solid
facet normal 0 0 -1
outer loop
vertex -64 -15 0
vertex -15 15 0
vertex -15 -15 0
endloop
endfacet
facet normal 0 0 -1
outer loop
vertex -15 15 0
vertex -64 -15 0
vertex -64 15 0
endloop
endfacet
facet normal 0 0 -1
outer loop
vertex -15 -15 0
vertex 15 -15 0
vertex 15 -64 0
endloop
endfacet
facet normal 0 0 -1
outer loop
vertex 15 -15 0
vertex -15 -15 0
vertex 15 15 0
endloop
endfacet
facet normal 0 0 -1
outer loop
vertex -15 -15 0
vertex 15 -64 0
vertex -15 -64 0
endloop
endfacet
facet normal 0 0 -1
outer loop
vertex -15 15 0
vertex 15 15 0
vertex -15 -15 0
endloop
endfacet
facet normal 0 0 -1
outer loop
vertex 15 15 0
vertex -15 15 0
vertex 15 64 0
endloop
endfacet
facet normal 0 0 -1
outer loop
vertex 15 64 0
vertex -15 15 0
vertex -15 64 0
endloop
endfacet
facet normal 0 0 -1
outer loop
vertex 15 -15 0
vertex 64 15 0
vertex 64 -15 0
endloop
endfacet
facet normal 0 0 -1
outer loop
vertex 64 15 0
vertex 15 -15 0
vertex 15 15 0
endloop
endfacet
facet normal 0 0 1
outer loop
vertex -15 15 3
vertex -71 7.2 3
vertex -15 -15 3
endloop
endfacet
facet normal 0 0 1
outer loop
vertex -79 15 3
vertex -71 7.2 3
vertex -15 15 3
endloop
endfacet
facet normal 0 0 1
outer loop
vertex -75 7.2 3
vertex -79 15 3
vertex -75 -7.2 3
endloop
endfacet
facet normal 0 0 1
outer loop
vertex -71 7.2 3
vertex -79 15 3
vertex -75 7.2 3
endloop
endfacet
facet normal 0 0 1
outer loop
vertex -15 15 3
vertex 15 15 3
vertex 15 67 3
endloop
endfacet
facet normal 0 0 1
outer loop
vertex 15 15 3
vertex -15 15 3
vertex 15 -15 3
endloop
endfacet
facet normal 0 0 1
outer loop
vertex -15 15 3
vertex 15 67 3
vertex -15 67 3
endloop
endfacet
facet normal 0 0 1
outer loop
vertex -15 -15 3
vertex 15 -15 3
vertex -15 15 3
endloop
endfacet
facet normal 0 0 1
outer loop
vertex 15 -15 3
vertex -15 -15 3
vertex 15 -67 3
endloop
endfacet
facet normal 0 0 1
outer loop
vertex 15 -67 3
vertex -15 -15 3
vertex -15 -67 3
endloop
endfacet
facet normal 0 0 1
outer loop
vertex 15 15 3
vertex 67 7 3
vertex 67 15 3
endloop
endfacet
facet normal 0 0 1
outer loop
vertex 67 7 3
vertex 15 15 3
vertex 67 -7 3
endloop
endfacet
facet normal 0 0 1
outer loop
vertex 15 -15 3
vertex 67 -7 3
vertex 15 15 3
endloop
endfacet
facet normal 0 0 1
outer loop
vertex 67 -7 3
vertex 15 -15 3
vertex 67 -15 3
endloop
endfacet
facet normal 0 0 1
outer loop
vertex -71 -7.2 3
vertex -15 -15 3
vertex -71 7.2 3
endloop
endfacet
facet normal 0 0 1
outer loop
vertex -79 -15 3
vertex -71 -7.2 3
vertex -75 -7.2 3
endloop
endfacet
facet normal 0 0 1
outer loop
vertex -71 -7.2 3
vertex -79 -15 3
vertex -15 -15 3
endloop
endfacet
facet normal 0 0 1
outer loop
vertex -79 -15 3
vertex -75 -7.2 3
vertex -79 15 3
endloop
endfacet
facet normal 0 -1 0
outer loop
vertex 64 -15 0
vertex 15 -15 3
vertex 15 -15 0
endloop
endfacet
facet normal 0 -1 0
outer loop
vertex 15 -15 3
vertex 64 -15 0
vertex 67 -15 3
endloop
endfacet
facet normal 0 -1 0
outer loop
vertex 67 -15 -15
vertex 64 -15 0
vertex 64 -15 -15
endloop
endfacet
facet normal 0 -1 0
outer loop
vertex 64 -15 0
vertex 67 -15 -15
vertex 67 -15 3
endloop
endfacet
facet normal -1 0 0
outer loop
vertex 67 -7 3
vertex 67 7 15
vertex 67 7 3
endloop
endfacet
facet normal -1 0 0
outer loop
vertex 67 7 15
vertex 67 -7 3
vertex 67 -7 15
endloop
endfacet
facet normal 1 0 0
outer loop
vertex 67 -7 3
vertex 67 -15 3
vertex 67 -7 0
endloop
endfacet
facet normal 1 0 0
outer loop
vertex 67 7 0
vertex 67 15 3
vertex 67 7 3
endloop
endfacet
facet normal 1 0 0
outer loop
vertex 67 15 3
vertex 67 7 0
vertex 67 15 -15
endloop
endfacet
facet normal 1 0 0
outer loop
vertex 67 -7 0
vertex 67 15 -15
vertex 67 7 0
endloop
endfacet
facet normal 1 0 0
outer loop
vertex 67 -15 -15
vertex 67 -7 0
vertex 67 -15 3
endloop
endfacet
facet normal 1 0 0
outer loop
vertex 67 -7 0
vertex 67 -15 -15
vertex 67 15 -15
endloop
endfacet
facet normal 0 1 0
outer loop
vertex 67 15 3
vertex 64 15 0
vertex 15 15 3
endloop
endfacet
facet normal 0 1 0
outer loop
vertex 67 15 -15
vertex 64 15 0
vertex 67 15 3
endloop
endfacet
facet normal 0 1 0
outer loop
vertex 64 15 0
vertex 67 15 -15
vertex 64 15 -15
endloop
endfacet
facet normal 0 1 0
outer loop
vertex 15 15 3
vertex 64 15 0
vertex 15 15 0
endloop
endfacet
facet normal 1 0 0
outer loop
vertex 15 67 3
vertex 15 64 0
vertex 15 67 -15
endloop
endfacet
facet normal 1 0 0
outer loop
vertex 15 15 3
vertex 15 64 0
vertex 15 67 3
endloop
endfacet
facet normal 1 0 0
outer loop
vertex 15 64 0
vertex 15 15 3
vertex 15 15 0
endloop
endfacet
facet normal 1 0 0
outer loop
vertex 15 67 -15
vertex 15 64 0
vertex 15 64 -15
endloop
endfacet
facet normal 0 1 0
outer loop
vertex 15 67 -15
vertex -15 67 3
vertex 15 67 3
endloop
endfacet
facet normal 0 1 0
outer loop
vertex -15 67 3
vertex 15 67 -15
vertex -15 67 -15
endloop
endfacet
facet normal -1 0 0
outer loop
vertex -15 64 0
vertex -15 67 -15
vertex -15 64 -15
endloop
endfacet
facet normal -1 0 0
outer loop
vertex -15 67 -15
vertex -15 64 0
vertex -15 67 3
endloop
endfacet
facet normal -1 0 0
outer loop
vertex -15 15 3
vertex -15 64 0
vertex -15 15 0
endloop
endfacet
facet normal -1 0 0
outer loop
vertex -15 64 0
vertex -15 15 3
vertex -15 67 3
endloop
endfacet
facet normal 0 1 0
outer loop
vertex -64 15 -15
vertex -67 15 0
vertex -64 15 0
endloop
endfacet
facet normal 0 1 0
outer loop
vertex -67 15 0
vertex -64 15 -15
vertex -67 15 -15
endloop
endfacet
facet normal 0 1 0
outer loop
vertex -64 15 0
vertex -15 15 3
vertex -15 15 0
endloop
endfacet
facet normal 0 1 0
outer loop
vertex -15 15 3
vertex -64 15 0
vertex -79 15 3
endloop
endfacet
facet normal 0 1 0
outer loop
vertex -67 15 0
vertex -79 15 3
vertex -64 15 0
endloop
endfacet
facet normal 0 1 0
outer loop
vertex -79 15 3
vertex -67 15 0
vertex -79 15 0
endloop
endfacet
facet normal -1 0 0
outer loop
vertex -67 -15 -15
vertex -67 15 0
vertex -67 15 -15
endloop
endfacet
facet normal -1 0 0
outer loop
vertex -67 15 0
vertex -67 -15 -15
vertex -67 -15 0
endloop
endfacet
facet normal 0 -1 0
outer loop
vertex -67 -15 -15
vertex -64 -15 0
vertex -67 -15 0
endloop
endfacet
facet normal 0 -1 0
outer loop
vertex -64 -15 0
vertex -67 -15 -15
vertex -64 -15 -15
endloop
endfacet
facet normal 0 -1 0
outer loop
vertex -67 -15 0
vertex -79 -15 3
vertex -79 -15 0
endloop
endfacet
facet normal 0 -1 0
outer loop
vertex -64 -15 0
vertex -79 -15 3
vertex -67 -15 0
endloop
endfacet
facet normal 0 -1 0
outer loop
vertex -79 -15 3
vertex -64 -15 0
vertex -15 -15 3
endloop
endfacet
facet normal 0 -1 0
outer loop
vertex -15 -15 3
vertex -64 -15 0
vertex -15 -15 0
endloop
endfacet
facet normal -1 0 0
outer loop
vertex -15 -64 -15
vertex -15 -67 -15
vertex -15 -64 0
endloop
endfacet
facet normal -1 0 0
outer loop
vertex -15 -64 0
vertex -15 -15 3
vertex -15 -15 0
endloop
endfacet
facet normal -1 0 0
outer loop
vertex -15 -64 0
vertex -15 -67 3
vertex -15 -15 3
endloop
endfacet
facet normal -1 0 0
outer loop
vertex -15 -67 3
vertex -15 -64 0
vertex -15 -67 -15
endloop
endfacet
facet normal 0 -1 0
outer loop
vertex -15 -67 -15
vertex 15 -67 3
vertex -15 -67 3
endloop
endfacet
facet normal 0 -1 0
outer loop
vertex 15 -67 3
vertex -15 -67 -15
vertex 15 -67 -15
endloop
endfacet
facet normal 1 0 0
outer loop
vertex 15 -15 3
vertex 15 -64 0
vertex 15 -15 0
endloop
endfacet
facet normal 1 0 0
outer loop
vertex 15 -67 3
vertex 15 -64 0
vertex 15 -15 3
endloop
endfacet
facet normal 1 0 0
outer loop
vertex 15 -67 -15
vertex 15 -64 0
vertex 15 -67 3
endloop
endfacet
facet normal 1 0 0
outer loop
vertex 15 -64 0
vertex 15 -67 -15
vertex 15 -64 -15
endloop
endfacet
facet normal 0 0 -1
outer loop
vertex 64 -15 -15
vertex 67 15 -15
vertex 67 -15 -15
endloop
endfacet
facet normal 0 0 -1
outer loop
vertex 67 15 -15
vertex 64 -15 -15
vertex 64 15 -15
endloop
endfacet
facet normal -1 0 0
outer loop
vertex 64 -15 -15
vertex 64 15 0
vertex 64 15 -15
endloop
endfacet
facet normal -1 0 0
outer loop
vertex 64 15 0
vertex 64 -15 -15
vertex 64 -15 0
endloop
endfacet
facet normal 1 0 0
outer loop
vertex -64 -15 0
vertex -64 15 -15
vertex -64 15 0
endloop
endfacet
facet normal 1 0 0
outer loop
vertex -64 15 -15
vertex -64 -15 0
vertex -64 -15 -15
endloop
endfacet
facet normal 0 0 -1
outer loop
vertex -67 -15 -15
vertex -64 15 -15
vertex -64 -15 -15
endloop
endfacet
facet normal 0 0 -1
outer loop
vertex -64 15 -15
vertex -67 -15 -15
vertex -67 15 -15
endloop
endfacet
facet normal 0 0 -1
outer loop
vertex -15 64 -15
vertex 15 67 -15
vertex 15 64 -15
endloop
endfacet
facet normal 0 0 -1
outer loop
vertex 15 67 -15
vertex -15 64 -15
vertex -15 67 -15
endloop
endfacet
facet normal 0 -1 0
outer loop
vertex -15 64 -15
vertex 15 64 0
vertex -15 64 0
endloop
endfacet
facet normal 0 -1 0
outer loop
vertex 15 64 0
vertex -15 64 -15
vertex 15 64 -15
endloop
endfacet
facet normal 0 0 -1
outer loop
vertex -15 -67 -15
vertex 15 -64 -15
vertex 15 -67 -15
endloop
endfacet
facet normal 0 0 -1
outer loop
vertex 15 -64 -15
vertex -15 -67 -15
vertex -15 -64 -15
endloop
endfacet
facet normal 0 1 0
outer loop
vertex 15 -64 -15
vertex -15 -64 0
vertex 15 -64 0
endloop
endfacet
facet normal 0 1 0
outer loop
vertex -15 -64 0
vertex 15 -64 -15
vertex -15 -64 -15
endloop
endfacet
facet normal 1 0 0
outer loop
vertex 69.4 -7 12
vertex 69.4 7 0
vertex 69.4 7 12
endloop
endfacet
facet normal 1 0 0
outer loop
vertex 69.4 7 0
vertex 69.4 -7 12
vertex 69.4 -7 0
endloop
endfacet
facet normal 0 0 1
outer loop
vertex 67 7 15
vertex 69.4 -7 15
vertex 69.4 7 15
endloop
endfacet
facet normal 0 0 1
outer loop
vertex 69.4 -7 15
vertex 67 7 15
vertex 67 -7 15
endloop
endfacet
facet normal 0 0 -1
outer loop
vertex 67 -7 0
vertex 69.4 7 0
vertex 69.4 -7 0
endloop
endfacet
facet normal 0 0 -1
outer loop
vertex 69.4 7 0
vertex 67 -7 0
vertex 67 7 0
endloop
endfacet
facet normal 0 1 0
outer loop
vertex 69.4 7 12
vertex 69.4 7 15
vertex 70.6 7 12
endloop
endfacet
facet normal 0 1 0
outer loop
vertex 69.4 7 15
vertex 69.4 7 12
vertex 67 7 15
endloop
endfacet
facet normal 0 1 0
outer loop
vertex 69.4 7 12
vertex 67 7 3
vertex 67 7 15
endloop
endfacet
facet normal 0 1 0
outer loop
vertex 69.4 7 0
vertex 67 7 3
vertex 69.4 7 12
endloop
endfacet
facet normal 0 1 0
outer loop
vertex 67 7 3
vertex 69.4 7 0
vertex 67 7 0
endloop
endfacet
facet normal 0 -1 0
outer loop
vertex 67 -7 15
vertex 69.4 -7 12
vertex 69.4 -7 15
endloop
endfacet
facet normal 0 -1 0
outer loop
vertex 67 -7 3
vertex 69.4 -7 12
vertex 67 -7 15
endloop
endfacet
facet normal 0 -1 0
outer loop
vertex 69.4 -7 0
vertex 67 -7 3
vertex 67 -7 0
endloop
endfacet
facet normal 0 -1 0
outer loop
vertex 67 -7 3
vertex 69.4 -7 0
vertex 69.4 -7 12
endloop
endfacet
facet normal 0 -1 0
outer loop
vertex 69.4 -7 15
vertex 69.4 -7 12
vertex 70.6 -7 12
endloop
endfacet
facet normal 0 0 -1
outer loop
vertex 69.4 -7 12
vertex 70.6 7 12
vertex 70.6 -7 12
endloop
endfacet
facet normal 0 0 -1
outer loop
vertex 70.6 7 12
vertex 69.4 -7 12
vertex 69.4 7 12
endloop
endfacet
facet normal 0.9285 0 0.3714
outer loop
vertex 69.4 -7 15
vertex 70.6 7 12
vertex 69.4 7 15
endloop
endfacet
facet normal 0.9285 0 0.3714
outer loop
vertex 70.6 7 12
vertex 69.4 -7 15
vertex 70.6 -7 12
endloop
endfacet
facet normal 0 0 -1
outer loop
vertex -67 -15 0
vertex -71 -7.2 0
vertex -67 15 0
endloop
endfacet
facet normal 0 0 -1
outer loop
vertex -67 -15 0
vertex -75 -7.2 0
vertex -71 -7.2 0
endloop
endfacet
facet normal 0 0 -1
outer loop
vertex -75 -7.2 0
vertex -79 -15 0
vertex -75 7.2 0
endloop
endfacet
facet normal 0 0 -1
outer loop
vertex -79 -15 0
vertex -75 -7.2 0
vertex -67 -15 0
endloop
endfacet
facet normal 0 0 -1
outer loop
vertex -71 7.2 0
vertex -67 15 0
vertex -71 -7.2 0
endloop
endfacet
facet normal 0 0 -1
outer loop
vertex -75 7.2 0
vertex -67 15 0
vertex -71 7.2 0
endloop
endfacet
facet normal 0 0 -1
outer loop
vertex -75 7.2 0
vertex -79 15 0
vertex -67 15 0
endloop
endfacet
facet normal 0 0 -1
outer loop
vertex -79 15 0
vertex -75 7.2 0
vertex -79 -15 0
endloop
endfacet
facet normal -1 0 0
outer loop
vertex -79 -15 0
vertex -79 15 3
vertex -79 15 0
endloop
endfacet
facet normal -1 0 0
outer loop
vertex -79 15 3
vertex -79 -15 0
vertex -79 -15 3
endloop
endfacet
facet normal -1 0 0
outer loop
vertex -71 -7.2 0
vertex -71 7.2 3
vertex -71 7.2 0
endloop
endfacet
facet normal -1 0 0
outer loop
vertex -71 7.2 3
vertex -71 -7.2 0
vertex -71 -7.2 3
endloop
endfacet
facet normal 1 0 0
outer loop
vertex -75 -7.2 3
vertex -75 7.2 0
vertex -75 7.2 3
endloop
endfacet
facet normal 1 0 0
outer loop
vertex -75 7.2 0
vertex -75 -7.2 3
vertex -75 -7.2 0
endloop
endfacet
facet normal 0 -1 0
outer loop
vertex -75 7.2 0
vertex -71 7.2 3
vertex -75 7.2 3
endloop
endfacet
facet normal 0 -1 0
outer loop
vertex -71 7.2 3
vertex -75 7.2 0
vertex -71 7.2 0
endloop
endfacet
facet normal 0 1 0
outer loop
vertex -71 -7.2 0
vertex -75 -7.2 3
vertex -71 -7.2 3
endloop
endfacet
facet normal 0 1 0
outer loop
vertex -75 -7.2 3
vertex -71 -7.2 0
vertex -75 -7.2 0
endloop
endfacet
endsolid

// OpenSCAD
// "Plus"-shaped claw that drops onto a Mac mini M4 (127x127x50mm).
// Four fingers wrap ~15mm down each side. The +X arm tip carries a flexible
// snap-post with a barb; the -X arm tip carries a thru-hole receiver tab.
// Two prints chain end-to-end: print A's +X post snaps up through print B's
// -X receiver hole as print B is lowered onto its mini.

$fa = 2;
$fs = 0.5;

// === Mac mini M4 ===
mini_w = 127;

// === Claw ===
arm_width        = 30;
plate_thickness  = 3;
finger_height    = 15;
finger_thickness = 3;
side_clearance   = 0.5;

inner_span   = mini_w + 2 * side_clearance;
outer_span   = inner_span + 2 * finger_thickness;
finger_inner = inner_span / 2;
finger_outer = outer_span / 2;

// === Hook latch ===
post_thick    = 2.4;   // X thickness of the flexible post
post_width    = 14;    // Y width of the post
post_height   = 12;    // Z height above plate
barb_protrude = 1.2;   // how far the barb sticks out past post_thick
barb_height   = 3;     // Z height of the barb ramp
tab_reach     = 12;    // how far the receiver tab extends past the finger
tab_thickness = plate_thickness;  // same as plate for cleanliness
fit_gap       = 0.4;   // clearance around post in the receiver hole

module claw_body() {
    union() {
        linear_extrude(plate_thickness)
            union() {
                square([outer_span, arm_width], center = true);
                square([arm_width, outer_span], center = true);
            }
        translate([finger_inner, -arm_width/2, -finger_height])
            cube([finger_thickness, arm_width, finger_height + plate_thickness]);
        translate([-finger_outer, -arm_width/2, -finger_height])
            cube([finger_thickness, arm_width, finger_height + plate_thickness]);
        translate([-arm_width/2, finger_inner, -finger_height])
            cube([arm_width, finger_thickness, finger_height + plate_thickness]);
        translate([-arm_width/2, -finger_outer, -finger_height])
            cube([arm_width, finger_thickness, finger_height + plate_thickness]);
    }
}

// Vertical flexible post on the +X arm, just outside the +X finger.
// Barb on +X face at the top: slope on top (insertion ramp), flat on bottom
// (retention face that catches the receiver tab against upward pull).
module snap_post() {
    post_x = finger_outer;
    cube_base = [post_x, -post_width/2, 0];
    translate(cube_base)
        cube([post_thick, post_width, plate_thickness + post_height]);
    // Triangular prism barb. Bottom face is flat (retention); top face slopes
    // from tip back to the post face (insertion ramp).
    x0 = post_x + post_thick;
    z0 = plate_thickness + post_height - barb_height;
    polyhedron(
        points = [
            [x0,                  -post_width/2, z0             ],
            [x0 + barb_protrude,  -post_width/2, z0             ],
            [x0,                  -post_width/2, z0 + barb_height],
            [x0,                   post_width/2, z0             ],
            [x0 + barb_protrude,   post_width/2, z0             ],
            [x0,                   post_width/2, z0 + barb_height],
        ],
        faces = [
            [0, 1, 2],
            [3, 5, 4],
            [0, 2, 5, 3],
            [0, 3, 4, 1],
            [1, 4, 5, 2],
        ]);
}

// Receiver tab on -X arm: extends outward past the -X finger with a thru-hole.
// As the mating print descends, its post (from another claw) enters this hole
// from below; the barb flexes through and snaps above the tab.
module receiver_tab() {
    // tab x range in this print's frame: [-finger_outer - tab_reach, -finger_outer]
    difference() {
        translate([-finger_outer - tab_reach, -arm_width/2, plate_thickness - tab_thickness])
            cube([tab_reach, arm_width, tab_thickness]);
        // thru-hole sized for post + barb_protrude + clearance
        hole_x = -finger_outer - tab_reach + (tab_reach - (post_thick + barb_protrude + fit_gap))/2;
        translate([hole_x, -(post_width + fit_gap)/2, plate_thickness - tab_thickness - 0.1])
            cube([post_thick + barb_protrude + fit_gap,
                  post_width + fit_gap,
                  tab_thickness + 0.2]);
    }
}

union() {
    claw_body();
    snap_post();
    receiver_tab();
}
